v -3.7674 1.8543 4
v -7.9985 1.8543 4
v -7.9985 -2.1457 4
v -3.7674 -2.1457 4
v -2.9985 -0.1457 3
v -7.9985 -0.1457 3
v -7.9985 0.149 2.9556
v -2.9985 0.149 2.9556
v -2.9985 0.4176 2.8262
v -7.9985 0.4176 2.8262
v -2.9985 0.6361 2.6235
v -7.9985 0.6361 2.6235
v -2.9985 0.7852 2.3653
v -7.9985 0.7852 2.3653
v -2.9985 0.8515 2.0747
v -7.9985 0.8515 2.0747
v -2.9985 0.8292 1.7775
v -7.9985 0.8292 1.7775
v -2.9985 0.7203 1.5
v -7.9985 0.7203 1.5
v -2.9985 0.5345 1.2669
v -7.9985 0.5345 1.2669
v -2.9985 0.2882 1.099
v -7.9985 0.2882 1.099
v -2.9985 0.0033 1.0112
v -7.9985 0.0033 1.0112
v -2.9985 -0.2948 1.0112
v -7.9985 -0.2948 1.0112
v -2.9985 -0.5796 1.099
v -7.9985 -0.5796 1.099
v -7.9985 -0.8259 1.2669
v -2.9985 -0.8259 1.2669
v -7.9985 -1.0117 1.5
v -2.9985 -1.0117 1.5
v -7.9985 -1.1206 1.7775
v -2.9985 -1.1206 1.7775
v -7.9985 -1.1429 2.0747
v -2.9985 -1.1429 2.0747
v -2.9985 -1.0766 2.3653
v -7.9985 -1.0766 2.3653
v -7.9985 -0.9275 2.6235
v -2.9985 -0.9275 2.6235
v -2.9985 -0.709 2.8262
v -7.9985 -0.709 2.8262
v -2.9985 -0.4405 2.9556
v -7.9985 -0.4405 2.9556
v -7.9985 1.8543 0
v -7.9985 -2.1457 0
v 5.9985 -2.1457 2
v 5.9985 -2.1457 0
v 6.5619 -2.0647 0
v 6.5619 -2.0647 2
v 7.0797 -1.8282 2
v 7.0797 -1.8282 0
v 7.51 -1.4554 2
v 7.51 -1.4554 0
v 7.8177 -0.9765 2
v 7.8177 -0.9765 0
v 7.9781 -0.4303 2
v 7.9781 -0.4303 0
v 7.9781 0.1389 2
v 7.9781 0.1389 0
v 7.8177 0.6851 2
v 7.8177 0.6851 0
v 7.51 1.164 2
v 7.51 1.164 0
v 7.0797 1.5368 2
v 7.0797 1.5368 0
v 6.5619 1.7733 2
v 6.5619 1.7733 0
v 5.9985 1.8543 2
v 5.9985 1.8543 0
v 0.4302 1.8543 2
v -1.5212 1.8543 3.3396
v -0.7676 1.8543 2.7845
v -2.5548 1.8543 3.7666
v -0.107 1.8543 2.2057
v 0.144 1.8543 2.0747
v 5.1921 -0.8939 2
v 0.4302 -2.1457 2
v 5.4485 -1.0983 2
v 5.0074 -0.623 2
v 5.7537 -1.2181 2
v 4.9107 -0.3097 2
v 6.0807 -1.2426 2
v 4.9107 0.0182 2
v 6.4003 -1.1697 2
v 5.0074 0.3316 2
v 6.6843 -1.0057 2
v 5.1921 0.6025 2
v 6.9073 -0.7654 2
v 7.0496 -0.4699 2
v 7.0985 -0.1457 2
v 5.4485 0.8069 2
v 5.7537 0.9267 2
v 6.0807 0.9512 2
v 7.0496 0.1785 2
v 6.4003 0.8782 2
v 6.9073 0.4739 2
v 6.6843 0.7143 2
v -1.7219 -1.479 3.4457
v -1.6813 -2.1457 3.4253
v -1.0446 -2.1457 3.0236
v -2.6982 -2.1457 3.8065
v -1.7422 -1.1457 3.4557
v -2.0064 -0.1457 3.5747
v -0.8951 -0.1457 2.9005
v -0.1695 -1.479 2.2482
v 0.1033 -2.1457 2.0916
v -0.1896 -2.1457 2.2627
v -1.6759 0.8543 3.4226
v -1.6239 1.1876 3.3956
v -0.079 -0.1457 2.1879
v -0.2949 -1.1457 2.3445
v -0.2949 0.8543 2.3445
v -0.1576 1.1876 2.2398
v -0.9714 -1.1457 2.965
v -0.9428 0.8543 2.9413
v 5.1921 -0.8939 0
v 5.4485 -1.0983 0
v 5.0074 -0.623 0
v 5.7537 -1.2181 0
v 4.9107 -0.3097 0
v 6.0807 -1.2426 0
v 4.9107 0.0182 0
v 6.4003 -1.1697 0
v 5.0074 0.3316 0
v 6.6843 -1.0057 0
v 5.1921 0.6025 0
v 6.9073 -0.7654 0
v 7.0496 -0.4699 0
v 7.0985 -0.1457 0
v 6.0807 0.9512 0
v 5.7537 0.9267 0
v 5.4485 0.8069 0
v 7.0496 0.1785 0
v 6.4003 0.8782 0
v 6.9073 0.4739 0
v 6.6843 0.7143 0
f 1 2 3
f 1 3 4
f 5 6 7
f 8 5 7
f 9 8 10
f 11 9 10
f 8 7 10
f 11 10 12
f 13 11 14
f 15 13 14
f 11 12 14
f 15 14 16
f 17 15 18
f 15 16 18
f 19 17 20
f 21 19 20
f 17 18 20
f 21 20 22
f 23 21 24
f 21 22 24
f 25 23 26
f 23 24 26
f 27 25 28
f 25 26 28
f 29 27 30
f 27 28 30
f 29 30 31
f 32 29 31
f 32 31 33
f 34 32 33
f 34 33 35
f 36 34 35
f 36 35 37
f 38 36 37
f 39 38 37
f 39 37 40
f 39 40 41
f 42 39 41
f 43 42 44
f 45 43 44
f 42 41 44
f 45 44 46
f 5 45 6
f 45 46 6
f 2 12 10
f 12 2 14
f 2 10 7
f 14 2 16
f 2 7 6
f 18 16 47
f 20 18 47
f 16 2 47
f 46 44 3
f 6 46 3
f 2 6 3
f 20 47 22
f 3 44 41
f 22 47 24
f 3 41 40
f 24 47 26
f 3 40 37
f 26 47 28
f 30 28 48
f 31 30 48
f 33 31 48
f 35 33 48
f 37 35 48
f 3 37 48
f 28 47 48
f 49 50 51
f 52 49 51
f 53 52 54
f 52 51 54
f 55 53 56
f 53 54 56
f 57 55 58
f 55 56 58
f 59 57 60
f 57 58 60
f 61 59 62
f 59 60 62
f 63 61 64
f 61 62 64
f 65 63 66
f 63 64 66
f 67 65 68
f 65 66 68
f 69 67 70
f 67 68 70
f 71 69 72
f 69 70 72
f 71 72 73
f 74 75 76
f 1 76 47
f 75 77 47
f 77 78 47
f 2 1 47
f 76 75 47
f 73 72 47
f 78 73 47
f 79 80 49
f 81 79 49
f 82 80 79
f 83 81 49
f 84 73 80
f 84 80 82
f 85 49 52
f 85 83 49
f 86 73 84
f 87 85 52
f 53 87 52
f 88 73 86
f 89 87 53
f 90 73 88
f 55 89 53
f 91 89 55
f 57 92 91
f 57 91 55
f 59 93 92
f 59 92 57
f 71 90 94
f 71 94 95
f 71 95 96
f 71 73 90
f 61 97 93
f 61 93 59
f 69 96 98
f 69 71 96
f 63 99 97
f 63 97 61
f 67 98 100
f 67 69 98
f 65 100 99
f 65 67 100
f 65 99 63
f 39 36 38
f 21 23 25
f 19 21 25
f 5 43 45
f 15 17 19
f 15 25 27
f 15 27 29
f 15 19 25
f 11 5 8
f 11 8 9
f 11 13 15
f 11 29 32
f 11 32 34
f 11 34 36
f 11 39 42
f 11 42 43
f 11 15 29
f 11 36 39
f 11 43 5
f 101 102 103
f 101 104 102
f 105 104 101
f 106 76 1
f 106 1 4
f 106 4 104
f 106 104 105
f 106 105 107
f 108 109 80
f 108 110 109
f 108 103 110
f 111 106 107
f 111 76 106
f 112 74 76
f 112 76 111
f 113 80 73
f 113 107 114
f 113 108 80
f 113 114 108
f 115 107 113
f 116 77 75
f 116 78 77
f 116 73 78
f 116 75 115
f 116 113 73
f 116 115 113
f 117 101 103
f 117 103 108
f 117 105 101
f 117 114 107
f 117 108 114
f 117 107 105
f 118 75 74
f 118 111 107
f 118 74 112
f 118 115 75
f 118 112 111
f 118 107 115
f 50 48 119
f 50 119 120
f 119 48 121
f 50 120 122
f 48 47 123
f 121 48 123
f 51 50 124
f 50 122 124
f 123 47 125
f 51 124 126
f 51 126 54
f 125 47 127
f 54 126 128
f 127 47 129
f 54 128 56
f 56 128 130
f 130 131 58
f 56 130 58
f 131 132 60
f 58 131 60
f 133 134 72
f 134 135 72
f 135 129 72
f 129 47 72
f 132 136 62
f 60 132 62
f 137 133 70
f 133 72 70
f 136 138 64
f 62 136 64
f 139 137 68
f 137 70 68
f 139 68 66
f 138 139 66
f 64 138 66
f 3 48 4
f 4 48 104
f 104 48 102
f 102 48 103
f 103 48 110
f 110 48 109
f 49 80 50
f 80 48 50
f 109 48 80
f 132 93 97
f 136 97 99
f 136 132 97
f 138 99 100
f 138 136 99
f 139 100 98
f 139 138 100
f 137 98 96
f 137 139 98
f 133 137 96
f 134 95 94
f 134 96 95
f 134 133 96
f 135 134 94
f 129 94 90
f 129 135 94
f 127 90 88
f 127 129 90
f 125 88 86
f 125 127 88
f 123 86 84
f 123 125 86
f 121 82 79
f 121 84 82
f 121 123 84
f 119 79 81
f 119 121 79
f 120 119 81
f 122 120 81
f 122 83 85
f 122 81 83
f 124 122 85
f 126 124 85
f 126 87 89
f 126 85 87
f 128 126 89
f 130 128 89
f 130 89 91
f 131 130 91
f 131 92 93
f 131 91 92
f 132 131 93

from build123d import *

# Parameters (mm, degrees)
SKETCH_2_R          = 1.100000024
EXTRUDE_1_DEPTH     = 4
SKETCH_4_R          = 1
CUT_EXTRUDE_1_DEPTH = 5
CUT_EXTRUDE_2_DEPTH = 5


with BuildPart() as part:
    # 草图2 → 凸台-拉伸1 (new body)
    with BuildSketch(Plane.XY):
        with BuildLine():
            Line((5.998458769, 1.854285714), (-7.998458769, 1.854285714))
            Line((-7.998458769, 1.854285714), (-7.998458769, -2.145714286))
            Line((-7.998458769, -2.145714286), (5.998458769, -2.145714286))
            ThreePointArc((5.998458769, -2.145714286), (7.998458769, -0.145714286), (5.998458769, 1.854285714))
        make_face()
        with Locations((5.998458956, -0.145714128)):
            Circle(SKETCH_2_R, mode=Mode.SUBTRACT)
    extrude(amount=EXTRUDE_1_DEPTH)

    # 草图4 → 切除-拉伸1 (cut)
    with BuildSketch(Plane.ZY.offset(7.998458769)):
        with Locations((2, -0.145714286)):
            Circle(SKETCH_4_R)
    extrude(amount=-CUT_EXTRUDE_1_DEPTH, mode=Mode.SUBTRACT)

    # 草图6 → 切除-拉伸2 (cut)
    with BuildSketch(Plane(origin=(0, 1.854285714, 0), x_dir=(1, 0, 0), z_dir=(0, 1, 0))):
        with BuildLine():
            Line((0.430237449, -2), (8.42228294, -2))
            Line((8.42228294, -2), (8.42228294, -4.483544919))
            Line((8.42228294, -4.483544919), (-3.767400724, -4))
            add(Edge.make_bspline(
                [(-3.767400724, -4), (-2.756163947, -3.891783592), (-1.123117091, -3.429006158), (-0.148462867, -2.077202756), (0.430237449, -2)],
                knots=[0, 0, 0, 0, 0.656759568, 1, 1, 1, 1], degree=3))
        make_face()
    extrude(amount=-CUT_EXTRUDE_2_DEPTH, mode=Mode.SUBTRACT)


solid = part.part
